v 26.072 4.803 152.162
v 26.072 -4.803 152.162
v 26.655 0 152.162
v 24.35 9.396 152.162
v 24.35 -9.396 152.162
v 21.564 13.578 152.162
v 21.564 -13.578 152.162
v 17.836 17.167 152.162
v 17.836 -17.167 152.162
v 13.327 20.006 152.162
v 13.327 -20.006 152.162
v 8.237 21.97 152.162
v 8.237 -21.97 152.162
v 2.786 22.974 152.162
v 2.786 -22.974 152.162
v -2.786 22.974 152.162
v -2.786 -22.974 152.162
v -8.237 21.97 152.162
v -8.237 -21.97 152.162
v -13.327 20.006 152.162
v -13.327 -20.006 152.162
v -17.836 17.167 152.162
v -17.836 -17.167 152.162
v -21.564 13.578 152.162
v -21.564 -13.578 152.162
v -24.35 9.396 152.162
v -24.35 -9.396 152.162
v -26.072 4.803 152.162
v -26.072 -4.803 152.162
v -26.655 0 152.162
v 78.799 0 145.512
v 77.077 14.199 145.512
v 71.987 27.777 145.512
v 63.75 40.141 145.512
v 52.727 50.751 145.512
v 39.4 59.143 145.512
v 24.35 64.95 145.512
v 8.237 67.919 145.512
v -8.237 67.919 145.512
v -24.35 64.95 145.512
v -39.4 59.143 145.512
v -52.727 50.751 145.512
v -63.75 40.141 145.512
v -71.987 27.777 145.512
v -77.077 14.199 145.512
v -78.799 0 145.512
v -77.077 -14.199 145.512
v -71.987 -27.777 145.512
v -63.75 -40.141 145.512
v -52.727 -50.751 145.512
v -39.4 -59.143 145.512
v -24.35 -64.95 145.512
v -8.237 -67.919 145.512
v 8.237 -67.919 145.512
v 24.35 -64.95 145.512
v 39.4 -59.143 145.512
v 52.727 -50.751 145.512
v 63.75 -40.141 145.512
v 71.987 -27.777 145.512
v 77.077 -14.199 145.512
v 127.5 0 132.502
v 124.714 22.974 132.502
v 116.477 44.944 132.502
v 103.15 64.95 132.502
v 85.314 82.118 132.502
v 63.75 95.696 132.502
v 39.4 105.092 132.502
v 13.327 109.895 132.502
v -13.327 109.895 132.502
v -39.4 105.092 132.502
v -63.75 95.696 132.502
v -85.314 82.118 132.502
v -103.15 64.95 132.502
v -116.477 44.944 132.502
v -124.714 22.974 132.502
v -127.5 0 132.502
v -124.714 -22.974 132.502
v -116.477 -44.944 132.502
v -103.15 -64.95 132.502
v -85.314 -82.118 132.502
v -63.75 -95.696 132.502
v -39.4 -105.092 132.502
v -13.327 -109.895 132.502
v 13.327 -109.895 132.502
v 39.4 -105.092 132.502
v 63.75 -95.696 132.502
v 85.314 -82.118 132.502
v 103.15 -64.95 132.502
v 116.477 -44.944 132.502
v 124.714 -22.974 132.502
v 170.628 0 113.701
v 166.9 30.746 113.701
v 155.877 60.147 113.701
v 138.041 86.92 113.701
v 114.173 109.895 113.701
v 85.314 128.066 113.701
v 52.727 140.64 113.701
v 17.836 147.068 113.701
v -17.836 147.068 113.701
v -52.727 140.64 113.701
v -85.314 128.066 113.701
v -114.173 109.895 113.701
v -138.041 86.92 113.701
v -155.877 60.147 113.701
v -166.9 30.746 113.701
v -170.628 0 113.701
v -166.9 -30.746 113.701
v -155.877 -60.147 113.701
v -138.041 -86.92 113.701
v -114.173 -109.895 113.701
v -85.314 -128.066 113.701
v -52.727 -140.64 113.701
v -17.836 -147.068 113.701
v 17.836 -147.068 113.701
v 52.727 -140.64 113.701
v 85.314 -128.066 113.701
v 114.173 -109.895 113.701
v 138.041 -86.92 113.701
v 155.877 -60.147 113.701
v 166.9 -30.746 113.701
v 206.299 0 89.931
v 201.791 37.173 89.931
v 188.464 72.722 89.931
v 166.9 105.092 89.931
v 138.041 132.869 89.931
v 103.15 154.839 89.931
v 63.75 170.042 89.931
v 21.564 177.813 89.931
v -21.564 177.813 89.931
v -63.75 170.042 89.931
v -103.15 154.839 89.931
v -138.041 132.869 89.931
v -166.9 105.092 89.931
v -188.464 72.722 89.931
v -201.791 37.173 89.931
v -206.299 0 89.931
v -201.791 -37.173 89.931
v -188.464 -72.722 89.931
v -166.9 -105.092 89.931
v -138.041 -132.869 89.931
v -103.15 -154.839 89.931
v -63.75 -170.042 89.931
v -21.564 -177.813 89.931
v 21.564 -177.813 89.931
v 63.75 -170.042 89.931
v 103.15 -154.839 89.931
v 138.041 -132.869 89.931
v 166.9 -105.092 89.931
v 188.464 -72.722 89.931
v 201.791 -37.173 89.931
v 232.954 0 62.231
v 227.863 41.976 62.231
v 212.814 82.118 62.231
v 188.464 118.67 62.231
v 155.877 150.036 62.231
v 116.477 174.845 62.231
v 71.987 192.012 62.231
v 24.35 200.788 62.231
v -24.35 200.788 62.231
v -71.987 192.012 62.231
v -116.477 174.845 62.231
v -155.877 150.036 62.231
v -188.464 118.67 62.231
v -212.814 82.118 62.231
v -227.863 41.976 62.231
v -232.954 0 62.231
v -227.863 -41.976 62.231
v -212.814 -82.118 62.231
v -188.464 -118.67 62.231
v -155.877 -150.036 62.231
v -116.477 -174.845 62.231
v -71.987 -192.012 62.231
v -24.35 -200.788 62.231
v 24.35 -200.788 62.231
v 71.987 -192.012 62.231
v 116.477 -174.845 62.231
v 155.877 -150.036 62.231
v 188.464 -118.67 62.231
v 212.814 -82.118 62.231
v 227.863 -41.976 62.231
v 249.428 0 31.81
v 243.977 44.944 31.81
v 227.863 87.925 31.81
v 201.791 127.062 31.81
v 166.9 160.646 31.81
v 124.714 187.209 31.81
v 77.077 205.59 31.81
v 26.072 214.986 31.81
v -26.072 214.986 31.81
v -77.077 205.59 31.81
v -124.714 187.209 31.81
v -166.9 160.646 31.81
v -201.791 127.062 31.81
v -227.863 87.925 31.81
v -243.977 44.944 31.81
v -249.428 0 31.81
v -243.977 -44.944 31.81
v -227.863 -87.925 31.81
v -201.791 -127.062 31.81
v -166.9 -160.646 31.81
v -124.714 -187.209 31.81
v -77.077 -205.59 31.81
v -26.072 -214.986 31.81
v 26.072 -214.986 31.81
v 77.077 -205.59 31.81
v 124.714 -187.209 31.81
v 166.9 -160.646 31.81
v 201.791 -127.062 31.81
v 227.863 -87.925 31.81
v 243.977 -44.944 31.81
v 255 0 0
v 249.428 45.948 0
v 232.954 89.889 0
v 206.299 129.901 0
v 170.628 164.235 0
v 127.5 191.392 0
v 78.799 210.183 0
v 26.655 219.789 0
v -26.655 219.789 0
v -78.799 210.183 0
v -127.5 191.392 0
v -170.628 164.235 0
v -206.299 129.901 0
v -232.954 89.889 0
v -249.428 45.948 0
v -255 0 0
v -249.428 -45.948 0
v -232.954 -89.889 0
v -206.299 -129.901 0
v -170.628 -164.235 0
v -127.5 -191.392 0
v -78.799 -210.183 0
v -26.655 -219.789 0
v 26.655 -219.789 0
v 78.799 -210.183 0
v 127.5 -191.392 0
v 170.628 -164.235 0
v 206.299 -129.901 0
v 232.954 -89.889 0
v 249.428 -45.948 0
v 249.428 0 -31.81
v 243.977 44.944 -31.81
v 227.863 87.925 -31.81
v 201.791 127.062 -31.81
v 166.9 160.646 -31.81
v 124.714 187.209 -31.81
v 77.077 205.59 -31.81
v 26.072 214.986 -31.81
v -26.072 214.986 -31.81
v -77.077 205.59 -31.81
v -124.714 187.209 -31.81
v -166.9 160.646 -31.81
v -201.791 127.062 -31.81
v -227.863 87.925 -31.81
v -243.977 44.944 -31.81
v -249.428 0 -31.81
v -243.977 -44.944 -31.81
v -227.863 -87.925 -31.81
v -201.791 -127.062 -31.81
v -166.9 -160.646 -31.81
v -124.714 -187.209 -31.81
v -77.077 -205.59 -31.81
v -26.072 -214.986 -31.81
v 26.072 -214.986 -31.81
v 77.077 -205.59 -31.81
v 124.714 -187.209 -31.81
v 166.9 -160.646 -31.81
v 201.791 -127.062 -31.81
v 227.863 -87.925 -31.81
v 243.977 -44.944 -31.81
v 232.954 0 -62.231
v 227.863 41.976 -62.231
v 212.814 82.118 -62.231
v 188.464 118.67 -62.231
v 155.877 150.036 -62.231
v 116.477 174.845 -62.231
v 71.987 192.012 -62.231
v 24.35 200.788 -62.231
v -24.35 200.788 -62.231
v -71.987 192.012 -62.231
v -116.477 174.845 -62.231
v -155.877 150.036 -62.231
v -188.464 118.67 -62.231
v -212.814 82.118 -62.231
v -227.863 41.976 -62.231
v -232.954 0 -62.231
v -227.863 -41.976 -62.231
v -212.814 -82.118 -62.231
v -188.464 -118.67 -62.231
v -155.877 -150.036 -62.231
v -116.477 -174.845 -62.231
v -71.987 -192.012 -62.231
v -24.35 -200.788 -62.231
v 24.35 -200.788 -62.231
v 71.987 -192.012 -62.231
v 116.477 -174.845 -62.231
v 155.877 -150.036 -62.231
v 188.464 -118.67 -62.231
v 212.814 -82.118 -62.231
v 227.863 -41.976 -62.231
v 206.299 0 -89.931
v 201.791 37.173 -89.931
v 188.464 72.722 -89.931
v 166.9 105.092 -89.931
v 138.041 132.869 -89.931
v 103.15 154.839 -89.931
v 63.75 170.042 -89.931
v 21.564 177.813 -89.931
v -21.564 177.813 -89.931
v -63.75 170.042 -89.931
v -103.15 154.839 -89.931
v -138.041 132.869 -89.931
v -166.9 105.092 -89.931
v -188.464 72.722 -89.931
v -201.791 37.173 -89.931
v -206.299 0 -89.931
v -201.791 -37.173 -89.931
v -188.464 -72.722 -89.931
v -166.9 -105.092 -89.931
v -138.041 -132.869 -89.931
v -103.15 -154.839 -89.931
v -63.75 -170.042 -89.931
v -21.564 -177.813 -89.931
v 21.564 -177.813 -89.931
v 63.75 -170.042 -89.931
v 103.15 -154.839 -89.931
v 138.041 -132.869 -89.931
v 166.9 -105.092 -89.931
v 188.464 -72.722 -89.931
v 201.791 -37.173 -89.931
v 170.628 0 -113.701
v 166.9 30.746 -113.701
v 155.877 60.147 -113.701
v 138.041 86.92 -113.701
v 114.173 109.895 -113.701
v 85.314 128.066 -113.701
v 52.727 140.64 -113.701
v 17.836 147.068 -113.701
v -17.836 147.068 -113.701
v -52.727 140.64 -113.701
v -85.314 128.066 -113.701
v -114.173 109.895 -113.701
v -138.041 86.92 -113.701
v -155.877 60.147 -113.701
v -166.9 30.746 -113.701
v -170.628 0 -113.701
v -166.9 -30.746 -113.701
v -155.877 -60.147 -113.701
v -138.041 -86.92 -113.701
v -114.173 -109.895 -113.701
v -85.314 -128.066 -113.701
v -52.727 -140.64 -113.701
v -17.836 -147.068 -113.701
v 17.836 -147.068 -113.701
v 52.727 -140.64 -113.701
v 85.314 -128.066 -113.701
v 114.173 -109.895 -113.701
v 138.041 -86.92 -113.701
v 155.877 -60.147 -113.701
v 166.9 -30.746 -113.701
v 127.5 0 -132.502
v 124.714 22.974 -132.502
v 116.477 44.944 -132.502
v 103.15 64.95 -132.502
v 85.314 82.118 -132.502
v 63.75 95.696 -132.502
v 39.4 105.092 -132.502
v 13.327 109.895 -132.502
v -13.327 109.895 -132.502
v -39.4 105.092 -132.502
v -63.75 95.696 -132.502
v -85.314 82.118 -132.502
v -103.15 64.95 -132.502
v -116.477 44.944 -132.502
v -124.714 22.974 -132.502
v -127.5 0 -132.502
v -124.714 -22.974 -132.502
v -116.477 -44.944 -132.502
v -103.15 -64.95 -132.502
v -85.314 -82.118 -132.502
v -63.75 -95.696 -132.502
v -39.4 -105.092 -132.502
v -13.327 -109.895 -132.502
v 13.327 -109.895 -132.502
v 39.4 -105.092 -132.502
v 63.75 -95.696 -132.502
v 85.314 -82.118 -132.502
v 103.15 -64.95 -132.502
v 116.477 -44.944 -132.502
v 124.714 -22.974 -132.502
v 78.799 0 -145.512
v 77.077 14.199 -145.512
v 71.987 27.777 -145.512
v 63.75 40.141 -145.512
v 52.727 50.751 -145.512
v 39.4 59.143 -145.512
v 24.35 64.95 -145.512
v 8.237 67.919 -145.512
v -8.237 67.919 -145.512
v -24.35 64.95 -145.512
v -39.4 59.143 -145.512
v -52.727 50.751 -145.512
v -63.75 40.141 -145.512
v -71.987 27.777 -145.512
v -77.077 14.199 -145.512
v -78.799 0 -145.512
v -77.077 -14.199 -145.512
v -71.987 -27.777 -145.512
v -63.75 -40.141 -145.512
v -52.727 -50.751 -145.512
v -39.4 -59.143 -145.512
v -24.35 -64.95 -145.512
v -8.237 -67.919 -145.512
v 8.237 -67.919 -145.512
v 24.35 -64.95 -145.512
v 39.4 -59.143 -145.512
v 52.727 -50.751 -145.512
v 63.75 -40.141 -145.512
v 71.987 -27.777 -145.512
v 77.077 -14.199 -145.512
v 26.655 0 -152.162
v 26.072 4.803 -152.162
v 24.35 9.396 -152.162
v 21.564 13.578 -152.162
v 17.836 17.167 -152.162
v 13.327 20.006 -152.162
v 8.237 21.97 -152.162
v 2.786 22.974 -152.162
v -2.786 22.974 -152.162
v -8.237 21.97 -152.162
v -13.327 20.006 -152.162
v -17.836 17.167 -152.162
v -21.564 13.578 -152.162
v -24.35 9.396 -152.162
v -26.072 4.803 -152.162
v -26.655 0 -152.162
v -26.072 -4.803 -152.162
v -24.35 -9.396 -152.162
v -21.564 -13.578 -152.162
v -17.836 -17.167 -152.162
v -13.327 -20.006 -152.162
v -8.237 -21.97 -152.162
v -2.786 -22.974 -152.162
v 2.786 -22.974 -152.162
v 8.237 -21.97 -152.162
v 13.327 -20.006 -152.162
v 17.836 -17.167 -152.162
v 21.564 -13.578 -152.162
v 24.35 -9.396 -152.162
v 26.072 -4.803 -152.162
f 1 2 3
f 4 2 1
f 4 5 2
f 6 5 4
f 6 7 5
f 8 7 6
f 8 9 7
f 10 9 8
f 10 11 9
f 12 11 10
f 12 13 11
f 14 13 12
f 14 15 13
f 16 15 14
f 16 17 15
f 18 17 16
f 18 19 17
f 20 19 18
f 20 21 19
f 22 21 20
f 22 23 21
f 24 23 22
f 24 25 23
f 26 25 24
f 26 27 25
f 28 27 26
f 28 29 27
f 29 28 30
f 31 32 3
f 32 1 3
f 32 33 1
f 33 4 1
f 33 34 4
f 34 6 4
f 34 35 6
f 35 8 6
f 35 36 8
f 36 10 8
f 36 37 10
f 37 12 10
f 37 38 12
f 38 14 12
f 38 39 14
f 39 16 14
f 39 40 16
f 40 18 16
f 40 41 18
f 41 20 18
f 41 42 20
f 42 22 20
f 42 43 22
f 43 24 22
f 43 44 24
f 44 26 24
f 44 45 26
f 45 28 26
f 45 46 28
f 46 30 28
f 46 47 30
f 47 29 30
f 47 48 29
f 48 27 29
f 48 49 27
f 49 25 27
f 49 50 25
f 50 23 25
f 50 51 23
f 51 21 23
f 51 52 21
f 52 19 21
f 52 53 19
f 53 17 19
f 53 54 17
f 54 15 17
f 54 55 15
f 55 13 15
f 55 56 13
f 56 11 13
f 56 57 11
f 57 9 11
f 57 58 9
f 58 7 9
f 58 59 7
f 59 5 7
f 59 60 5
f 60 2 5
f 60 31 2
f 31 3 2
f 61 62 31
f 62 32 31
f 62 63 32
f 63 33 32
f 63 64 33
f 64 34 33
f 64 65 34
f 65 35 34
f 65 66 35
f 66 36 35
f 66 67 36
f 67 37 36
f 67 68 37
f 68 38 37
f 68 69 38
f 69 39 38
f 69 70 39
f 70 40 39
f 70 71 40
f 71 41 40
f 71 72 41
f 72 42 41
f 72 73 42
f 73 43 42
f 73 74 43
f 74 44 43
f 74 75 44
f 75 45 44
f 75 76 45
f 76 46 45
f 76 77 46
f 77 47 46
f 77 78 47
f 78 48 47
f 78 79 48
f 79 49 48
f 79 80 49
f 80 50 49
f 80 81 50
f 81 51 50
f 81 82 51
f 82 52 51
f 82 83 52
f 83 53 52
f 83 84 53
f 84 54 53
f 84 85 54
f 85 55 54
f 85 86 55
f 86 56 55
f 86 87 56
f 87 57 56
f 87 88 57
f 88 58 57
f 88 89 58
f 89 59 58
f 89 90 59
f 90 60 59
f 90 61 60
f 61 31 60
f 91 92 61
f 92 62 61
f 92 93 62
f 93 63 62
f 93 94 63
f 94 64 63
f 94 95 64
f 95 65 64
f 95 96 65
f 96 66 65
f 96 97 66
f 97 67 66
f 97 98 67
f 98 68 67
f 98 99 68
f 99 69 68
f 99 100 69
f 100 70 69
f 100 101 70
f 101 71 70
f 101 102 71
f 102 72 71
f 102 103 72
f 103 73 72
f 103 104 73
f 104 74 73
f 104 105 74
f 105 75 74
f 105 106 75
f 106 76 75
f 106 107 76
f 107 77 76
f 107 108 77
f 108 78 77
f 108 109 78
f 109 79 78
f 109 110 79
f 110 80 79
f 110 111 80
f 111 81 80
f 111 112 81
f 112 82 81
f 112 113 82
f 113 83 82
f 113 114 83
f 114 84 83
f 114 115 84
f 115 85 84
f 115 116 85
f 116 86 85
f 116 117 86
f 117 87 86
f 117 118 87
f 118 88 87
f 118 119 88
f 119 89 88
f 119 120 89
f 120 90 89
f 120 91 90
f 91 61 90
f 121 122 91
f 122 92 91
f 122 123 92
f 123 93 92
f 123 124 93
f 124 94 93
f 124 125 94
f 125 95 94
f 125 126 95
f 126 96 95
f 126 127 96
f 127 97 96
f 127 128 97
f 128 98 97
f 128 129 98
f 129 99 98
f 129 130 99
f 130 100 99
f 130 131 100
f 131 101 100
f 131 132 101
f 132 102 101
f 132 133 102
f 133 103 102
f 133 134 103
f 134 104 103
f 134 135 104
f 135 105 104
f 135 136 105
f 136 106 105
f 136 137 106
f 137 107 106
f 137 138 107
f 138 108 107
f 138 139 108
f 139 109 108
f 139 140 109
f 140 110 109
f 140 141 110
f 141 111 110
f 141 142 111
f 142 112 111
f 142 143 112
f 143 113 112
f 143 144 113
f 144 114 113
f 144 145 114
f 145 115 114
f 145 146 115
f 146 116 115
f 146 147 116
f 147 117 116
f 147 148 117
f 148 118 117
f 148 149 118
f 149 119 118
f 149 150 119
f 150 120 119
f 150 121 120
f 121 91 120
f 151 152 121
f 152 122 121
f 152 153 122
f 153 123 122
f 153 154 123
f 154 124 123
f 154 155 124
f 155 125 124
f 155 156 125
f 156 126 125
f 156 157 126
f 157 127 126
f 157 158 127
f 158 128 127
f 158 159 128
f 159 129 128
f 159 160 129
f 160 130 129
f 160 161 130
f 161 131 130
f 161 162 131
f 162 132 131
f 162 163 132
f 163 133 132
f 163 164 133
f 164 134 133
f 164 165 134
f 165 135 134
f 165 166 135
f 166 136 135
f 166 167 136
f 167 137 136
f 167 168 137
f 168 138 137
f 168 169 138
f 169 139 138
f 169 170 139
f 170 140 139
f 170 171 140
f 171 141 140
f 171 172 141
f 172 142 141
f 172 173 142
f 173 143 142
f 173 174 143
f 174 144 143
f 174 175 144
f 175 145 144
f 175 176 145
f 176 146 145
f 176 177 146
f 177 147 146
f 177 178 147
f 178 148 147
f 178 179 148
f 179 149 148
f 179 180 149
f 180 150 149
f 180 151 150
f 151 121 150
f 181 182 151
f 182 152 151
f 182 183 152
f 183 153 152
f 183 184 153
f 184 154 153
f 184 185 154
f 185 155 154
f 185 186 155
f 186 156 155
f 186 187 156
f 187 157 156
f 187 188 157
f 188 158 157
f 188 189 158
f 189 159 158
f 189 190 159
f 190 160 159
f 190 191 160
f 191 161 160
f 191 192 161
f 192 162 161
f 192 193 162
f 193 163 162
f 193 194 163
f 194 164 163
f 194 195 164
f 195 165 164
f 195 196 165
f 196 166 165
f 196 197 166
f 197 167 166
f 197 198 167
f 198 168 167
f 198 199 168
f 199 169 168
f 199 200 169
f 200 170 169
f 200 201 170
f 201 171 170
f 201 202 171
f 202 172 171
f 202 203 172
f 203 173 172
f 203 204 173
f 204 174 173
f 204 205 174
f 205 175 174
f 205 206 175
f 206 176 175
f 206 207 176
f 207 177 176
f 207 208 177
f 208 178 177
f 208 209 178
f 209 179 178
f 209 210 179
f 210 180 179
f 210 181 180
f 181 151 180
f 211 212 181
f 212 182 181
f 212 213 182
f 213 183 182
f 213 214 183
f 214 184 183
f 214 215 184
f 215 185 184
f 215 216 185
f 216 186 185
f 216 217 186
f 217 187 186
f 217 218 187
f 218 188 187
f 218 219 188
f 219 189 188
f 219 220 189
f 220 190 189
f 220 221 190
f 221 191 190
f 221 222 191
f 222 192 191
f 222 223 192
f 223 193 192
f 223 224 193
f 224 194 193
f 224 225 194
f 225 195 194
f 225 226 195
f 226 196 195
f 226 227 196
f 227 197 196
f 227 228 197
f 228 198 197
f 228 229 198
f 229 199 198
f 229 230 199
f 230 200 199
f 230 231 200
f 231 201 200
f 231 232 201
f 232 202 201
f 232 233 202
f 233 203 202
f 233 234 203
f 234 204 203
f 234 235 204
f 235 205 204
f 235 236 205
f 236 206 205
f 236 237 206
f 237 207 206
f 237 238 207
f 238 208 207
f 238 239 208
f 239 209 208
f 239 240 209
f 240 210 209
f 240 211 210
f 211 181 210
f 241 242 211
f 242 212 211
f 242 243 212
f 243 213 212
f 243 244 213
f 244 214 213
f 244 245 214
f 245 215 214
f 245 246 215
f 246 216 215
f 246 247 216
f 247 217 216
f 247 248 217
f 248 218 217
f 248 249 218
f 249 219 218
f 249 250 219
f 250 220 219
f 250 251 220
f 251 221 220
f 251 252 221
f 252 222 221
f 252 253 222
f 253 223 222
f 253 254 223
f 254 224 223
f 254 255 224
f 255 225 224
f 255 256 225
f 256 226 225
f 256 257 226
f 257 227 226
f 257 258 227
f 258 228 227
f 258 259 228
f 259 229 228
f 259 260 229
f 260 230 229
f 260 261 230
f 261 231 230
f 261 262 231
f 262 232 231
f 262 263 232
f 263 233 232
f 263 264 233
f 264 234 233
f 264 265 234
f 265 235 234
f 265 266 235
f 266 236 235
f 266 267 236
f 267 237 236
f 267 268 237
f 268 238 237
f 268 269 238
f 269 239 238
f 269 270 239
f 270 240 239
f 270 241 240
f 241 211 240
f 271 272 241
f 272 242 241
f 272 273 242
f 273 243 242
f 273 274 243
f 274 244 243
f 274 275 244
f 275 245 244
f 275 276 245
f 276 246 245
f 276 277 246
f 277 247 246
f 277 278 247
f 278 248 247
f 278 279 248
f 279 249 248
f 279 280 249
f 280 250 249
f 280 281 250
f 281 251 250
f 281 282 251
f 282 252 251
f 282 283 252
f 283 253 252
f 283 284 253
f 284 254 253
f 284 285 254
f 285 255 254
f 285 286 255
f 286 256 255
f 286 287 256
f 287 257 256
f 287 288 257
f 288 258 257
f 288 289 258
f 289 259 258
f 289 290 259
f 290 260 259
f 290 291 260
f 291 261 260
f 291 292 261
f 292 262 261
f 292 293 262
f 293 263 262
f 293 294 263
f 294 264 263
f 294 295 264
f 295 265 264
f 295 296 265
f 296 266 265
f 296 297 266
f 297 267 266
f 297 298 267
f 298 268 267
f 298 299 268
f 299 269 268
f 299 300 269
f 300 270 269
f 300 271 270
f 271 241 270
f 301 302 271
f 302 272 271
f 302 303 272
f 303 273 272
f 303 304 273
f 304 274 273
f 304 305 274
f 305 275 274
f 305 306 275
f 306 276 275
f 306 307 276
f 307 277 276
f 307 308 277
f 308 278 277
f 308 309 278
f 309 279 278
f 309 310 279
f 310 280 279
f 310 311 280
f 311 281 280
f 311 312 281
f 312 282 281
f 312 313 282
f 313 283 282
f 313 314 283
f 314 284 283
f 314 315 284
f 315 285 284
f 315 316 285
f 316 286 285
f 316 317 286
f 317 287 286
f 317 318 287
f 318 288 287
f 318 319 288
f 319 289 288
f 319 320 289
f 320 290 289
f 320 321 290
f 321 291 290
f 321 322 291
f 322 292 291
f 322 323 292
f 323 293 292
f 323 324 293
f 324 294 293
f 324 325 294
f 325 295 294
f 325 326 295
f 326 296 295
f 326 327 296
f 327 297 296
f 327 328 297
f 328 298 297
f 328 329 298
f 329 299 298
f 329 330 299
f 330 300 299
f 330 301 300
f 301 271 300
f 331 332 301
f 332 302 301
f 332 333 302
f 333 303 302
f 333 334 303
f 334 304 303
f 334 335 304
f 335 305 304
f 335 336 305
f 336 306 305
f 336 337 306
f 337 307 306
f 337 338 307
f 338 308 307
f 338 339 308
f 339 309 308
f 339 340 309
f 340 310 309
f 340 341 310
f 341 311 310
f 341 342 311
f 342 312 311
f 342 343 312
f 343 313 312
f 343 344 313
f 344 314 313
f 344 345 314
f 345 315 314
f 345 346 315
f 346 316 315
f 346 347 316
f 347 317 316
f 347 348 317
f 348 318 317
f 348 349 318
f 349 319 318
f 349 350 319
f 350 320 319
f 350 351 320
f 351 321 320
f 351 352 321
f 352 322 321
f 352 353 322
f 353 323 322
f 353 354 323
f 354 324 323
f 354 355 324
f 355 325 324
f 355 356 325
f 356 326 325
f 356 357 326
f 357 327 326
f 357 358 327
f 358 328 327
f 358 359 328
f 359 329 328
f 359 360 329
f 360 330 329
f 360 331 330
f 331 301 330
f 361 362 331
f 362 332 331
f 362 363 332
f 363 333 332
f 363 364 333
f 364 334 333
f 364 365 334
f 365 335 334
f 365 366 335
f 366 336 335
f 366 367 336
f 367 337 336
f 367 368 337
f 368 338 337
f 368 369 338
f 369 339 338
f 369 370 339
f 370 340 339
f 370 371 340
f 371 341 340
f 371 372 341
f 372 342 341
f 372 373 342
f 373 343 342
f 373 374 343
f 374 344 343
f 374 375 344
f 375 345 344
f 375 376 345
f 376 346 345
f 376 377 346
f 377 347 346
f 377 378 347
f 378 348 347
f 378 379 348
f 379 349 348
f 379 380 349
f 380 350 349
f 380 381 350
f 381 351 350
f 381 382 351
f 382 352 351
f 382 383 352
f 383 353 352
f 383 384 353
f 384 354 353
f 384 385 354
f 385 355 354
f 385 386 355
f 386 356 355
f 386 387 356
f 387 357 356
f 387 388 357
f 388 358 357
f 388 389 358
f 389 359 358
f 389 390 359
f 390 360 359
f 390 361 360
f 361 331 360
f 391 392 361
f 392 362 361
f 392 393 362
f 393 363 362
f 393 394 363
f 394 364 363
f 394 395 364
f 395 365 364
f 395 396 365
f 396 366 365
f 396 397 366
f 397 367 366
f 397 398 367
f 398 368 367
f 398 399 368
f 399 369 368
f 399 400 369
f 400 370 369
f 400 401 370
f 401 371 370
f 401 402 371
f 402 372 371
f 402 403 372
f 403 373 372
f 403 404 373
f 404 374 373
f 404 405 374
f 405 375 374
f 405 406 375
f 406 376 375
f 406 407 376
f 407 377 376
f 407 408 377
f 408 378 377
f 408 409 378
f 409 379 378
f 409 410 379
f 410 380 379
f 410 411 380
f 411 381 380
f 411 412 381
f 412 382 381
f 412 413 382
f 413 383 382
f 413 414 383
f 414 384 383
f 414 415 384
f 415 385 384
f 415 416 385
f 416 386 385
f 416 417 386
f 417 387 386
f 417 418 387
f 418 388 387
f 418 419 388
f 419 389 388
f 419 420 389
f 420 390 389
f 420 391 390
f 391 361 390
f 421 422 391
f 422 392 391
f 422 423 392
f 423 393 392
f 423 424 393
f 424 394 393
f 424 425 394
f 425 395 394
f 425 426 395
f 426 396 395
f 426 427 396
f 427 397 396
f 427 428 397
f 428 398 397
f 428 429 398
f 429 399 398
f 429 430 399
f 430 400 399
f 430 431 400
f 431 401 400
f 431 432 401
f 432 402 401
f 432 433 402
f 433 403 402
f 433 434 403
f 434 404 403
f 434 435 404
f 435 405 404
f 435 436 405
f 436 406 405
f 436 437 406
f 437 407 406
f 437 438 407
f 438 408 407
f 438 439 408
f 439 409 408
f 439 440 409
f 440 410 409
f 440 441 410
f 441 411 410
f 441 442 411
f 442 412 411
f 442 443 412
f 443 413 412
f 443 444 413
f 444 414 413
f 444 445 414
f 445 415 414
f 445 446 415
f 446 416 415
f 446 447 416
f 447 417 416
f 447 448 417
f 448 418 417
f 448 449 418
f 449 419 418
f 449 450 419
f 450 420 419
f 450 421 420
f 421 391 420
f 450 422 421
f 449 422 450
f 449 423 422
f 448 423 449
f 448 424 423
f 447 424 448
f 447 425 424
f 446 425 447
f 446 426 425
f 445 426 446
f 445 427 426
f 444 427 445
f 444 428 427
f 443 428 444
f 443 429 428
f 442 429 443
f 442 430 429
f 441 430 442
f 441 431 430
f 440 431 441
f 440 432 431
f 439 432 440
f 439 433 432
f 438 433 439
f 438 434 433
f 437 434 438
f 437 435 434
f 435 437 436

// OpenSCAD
// Generated by SolidPython 1.0.1 on 2020-07-29 00:46:52


scale(v = [15, 13, 9]) {
	sphere(r = 17);
}
/***********************************************
*********      SolidPython code:      **********
************************************************
 
# import packages: SolidPython
from solid import *
from solid.utils import *
from itertools import chain, combinations, permutations


class Resize:

    def __init__(self, scad_file):
        self.scad_file = scad_file
        #self.scad_file = import_scad(scad_file)
        # cone/cylinder param:
        self.r1 = 0
        self.r2 = 0
        self.h = 0
        # rectangular prism param:
        self.w = 0
        self.l = 0
        # ellipse param:
        self.r = 0

    # import OpenScad code (file name corresponds to shape)


    # classify shape + parameters
    def assign(self, param1, param2, param3):
        if self.scad_file == 'cone.scad':
            self.r1 = param1
            self.r2 = param2
            self.h = param3
        elif self.scad_file == 'cylinder.scad':
            self.r1 = param1
            self.r2 = param2
            self.h = param3
        elif self.scad_file == 'rectangularPrism.scad':
            self.h = param1
            self.l = param2
            self.w = param3
        else:
            self.r = param1
            self.h = param2

    # resize parameters
    def iterate(self):
        x = range(3, 20, 2)
        i = 1
        if self.scad_file == 'cone.scad':
            tempList = list(permutations(x, 2))
            for temp in tempList:
                param1 = temp[0]
                param2 = temp[1]
                filepath = 'produced_scad_files/' + 'cone' + str(param1) + '_' + str(param2) + '_' + '.scad'
                scad_render_to_file(cylinder(h=param1, r1=param2, r2=0), filepath)

        elif self.scad_file == 'cylinder.scad':
            tempList = list(permutations(x, 3))
            for temp in tempList:
                param1 = temp[0]
                param2 = temp[1]
                filepath = 'produced_scad_files/' + 'cylinder' + str(param1) + '_' + str(param2) + '_' + '.scad'
                scad_render_to_file(cylinder(h=param1, r1=param2, r2=param2), filepath)

        elif self.scad_file == 'rectangularPrism.scad':
            tempList = list(permutations(x, 3))
            for temp in tempList:
                param1 = temp[0]
                param2 = temp[1]
                param3 = temp[2]
                filepath = 'produced_scad_files/' + 'rectangularPrism' + str(param1) + '_' + str(param2) + '_' + str(
                    param3) + '.scad'
                scad_render_to_file(cube(size=(param1, param2, param3)), filepath)

        elif self.scad_file == 'ellipse.scad':
            tempList = list(permutations(x, 4))
            for temp in tempList:
                param1 = temp[0]
                param2 = temp[1]
                param3 = temp[2]
                param4 = temp[3]
                filepath = 'produced_scad_files/' + 'ellipse' + str(param1) + '_' + str(param2) + '_' + str(param3) + '_' + str(param4) + '.scad'
                scad_render_to_file(scale([param1, param2, param3])(sphere(r=param4)), filepath)

    def render_to_scadfile(self):
        scad_render_to_file(scad, 'example.scad') 
 
************************************************/
